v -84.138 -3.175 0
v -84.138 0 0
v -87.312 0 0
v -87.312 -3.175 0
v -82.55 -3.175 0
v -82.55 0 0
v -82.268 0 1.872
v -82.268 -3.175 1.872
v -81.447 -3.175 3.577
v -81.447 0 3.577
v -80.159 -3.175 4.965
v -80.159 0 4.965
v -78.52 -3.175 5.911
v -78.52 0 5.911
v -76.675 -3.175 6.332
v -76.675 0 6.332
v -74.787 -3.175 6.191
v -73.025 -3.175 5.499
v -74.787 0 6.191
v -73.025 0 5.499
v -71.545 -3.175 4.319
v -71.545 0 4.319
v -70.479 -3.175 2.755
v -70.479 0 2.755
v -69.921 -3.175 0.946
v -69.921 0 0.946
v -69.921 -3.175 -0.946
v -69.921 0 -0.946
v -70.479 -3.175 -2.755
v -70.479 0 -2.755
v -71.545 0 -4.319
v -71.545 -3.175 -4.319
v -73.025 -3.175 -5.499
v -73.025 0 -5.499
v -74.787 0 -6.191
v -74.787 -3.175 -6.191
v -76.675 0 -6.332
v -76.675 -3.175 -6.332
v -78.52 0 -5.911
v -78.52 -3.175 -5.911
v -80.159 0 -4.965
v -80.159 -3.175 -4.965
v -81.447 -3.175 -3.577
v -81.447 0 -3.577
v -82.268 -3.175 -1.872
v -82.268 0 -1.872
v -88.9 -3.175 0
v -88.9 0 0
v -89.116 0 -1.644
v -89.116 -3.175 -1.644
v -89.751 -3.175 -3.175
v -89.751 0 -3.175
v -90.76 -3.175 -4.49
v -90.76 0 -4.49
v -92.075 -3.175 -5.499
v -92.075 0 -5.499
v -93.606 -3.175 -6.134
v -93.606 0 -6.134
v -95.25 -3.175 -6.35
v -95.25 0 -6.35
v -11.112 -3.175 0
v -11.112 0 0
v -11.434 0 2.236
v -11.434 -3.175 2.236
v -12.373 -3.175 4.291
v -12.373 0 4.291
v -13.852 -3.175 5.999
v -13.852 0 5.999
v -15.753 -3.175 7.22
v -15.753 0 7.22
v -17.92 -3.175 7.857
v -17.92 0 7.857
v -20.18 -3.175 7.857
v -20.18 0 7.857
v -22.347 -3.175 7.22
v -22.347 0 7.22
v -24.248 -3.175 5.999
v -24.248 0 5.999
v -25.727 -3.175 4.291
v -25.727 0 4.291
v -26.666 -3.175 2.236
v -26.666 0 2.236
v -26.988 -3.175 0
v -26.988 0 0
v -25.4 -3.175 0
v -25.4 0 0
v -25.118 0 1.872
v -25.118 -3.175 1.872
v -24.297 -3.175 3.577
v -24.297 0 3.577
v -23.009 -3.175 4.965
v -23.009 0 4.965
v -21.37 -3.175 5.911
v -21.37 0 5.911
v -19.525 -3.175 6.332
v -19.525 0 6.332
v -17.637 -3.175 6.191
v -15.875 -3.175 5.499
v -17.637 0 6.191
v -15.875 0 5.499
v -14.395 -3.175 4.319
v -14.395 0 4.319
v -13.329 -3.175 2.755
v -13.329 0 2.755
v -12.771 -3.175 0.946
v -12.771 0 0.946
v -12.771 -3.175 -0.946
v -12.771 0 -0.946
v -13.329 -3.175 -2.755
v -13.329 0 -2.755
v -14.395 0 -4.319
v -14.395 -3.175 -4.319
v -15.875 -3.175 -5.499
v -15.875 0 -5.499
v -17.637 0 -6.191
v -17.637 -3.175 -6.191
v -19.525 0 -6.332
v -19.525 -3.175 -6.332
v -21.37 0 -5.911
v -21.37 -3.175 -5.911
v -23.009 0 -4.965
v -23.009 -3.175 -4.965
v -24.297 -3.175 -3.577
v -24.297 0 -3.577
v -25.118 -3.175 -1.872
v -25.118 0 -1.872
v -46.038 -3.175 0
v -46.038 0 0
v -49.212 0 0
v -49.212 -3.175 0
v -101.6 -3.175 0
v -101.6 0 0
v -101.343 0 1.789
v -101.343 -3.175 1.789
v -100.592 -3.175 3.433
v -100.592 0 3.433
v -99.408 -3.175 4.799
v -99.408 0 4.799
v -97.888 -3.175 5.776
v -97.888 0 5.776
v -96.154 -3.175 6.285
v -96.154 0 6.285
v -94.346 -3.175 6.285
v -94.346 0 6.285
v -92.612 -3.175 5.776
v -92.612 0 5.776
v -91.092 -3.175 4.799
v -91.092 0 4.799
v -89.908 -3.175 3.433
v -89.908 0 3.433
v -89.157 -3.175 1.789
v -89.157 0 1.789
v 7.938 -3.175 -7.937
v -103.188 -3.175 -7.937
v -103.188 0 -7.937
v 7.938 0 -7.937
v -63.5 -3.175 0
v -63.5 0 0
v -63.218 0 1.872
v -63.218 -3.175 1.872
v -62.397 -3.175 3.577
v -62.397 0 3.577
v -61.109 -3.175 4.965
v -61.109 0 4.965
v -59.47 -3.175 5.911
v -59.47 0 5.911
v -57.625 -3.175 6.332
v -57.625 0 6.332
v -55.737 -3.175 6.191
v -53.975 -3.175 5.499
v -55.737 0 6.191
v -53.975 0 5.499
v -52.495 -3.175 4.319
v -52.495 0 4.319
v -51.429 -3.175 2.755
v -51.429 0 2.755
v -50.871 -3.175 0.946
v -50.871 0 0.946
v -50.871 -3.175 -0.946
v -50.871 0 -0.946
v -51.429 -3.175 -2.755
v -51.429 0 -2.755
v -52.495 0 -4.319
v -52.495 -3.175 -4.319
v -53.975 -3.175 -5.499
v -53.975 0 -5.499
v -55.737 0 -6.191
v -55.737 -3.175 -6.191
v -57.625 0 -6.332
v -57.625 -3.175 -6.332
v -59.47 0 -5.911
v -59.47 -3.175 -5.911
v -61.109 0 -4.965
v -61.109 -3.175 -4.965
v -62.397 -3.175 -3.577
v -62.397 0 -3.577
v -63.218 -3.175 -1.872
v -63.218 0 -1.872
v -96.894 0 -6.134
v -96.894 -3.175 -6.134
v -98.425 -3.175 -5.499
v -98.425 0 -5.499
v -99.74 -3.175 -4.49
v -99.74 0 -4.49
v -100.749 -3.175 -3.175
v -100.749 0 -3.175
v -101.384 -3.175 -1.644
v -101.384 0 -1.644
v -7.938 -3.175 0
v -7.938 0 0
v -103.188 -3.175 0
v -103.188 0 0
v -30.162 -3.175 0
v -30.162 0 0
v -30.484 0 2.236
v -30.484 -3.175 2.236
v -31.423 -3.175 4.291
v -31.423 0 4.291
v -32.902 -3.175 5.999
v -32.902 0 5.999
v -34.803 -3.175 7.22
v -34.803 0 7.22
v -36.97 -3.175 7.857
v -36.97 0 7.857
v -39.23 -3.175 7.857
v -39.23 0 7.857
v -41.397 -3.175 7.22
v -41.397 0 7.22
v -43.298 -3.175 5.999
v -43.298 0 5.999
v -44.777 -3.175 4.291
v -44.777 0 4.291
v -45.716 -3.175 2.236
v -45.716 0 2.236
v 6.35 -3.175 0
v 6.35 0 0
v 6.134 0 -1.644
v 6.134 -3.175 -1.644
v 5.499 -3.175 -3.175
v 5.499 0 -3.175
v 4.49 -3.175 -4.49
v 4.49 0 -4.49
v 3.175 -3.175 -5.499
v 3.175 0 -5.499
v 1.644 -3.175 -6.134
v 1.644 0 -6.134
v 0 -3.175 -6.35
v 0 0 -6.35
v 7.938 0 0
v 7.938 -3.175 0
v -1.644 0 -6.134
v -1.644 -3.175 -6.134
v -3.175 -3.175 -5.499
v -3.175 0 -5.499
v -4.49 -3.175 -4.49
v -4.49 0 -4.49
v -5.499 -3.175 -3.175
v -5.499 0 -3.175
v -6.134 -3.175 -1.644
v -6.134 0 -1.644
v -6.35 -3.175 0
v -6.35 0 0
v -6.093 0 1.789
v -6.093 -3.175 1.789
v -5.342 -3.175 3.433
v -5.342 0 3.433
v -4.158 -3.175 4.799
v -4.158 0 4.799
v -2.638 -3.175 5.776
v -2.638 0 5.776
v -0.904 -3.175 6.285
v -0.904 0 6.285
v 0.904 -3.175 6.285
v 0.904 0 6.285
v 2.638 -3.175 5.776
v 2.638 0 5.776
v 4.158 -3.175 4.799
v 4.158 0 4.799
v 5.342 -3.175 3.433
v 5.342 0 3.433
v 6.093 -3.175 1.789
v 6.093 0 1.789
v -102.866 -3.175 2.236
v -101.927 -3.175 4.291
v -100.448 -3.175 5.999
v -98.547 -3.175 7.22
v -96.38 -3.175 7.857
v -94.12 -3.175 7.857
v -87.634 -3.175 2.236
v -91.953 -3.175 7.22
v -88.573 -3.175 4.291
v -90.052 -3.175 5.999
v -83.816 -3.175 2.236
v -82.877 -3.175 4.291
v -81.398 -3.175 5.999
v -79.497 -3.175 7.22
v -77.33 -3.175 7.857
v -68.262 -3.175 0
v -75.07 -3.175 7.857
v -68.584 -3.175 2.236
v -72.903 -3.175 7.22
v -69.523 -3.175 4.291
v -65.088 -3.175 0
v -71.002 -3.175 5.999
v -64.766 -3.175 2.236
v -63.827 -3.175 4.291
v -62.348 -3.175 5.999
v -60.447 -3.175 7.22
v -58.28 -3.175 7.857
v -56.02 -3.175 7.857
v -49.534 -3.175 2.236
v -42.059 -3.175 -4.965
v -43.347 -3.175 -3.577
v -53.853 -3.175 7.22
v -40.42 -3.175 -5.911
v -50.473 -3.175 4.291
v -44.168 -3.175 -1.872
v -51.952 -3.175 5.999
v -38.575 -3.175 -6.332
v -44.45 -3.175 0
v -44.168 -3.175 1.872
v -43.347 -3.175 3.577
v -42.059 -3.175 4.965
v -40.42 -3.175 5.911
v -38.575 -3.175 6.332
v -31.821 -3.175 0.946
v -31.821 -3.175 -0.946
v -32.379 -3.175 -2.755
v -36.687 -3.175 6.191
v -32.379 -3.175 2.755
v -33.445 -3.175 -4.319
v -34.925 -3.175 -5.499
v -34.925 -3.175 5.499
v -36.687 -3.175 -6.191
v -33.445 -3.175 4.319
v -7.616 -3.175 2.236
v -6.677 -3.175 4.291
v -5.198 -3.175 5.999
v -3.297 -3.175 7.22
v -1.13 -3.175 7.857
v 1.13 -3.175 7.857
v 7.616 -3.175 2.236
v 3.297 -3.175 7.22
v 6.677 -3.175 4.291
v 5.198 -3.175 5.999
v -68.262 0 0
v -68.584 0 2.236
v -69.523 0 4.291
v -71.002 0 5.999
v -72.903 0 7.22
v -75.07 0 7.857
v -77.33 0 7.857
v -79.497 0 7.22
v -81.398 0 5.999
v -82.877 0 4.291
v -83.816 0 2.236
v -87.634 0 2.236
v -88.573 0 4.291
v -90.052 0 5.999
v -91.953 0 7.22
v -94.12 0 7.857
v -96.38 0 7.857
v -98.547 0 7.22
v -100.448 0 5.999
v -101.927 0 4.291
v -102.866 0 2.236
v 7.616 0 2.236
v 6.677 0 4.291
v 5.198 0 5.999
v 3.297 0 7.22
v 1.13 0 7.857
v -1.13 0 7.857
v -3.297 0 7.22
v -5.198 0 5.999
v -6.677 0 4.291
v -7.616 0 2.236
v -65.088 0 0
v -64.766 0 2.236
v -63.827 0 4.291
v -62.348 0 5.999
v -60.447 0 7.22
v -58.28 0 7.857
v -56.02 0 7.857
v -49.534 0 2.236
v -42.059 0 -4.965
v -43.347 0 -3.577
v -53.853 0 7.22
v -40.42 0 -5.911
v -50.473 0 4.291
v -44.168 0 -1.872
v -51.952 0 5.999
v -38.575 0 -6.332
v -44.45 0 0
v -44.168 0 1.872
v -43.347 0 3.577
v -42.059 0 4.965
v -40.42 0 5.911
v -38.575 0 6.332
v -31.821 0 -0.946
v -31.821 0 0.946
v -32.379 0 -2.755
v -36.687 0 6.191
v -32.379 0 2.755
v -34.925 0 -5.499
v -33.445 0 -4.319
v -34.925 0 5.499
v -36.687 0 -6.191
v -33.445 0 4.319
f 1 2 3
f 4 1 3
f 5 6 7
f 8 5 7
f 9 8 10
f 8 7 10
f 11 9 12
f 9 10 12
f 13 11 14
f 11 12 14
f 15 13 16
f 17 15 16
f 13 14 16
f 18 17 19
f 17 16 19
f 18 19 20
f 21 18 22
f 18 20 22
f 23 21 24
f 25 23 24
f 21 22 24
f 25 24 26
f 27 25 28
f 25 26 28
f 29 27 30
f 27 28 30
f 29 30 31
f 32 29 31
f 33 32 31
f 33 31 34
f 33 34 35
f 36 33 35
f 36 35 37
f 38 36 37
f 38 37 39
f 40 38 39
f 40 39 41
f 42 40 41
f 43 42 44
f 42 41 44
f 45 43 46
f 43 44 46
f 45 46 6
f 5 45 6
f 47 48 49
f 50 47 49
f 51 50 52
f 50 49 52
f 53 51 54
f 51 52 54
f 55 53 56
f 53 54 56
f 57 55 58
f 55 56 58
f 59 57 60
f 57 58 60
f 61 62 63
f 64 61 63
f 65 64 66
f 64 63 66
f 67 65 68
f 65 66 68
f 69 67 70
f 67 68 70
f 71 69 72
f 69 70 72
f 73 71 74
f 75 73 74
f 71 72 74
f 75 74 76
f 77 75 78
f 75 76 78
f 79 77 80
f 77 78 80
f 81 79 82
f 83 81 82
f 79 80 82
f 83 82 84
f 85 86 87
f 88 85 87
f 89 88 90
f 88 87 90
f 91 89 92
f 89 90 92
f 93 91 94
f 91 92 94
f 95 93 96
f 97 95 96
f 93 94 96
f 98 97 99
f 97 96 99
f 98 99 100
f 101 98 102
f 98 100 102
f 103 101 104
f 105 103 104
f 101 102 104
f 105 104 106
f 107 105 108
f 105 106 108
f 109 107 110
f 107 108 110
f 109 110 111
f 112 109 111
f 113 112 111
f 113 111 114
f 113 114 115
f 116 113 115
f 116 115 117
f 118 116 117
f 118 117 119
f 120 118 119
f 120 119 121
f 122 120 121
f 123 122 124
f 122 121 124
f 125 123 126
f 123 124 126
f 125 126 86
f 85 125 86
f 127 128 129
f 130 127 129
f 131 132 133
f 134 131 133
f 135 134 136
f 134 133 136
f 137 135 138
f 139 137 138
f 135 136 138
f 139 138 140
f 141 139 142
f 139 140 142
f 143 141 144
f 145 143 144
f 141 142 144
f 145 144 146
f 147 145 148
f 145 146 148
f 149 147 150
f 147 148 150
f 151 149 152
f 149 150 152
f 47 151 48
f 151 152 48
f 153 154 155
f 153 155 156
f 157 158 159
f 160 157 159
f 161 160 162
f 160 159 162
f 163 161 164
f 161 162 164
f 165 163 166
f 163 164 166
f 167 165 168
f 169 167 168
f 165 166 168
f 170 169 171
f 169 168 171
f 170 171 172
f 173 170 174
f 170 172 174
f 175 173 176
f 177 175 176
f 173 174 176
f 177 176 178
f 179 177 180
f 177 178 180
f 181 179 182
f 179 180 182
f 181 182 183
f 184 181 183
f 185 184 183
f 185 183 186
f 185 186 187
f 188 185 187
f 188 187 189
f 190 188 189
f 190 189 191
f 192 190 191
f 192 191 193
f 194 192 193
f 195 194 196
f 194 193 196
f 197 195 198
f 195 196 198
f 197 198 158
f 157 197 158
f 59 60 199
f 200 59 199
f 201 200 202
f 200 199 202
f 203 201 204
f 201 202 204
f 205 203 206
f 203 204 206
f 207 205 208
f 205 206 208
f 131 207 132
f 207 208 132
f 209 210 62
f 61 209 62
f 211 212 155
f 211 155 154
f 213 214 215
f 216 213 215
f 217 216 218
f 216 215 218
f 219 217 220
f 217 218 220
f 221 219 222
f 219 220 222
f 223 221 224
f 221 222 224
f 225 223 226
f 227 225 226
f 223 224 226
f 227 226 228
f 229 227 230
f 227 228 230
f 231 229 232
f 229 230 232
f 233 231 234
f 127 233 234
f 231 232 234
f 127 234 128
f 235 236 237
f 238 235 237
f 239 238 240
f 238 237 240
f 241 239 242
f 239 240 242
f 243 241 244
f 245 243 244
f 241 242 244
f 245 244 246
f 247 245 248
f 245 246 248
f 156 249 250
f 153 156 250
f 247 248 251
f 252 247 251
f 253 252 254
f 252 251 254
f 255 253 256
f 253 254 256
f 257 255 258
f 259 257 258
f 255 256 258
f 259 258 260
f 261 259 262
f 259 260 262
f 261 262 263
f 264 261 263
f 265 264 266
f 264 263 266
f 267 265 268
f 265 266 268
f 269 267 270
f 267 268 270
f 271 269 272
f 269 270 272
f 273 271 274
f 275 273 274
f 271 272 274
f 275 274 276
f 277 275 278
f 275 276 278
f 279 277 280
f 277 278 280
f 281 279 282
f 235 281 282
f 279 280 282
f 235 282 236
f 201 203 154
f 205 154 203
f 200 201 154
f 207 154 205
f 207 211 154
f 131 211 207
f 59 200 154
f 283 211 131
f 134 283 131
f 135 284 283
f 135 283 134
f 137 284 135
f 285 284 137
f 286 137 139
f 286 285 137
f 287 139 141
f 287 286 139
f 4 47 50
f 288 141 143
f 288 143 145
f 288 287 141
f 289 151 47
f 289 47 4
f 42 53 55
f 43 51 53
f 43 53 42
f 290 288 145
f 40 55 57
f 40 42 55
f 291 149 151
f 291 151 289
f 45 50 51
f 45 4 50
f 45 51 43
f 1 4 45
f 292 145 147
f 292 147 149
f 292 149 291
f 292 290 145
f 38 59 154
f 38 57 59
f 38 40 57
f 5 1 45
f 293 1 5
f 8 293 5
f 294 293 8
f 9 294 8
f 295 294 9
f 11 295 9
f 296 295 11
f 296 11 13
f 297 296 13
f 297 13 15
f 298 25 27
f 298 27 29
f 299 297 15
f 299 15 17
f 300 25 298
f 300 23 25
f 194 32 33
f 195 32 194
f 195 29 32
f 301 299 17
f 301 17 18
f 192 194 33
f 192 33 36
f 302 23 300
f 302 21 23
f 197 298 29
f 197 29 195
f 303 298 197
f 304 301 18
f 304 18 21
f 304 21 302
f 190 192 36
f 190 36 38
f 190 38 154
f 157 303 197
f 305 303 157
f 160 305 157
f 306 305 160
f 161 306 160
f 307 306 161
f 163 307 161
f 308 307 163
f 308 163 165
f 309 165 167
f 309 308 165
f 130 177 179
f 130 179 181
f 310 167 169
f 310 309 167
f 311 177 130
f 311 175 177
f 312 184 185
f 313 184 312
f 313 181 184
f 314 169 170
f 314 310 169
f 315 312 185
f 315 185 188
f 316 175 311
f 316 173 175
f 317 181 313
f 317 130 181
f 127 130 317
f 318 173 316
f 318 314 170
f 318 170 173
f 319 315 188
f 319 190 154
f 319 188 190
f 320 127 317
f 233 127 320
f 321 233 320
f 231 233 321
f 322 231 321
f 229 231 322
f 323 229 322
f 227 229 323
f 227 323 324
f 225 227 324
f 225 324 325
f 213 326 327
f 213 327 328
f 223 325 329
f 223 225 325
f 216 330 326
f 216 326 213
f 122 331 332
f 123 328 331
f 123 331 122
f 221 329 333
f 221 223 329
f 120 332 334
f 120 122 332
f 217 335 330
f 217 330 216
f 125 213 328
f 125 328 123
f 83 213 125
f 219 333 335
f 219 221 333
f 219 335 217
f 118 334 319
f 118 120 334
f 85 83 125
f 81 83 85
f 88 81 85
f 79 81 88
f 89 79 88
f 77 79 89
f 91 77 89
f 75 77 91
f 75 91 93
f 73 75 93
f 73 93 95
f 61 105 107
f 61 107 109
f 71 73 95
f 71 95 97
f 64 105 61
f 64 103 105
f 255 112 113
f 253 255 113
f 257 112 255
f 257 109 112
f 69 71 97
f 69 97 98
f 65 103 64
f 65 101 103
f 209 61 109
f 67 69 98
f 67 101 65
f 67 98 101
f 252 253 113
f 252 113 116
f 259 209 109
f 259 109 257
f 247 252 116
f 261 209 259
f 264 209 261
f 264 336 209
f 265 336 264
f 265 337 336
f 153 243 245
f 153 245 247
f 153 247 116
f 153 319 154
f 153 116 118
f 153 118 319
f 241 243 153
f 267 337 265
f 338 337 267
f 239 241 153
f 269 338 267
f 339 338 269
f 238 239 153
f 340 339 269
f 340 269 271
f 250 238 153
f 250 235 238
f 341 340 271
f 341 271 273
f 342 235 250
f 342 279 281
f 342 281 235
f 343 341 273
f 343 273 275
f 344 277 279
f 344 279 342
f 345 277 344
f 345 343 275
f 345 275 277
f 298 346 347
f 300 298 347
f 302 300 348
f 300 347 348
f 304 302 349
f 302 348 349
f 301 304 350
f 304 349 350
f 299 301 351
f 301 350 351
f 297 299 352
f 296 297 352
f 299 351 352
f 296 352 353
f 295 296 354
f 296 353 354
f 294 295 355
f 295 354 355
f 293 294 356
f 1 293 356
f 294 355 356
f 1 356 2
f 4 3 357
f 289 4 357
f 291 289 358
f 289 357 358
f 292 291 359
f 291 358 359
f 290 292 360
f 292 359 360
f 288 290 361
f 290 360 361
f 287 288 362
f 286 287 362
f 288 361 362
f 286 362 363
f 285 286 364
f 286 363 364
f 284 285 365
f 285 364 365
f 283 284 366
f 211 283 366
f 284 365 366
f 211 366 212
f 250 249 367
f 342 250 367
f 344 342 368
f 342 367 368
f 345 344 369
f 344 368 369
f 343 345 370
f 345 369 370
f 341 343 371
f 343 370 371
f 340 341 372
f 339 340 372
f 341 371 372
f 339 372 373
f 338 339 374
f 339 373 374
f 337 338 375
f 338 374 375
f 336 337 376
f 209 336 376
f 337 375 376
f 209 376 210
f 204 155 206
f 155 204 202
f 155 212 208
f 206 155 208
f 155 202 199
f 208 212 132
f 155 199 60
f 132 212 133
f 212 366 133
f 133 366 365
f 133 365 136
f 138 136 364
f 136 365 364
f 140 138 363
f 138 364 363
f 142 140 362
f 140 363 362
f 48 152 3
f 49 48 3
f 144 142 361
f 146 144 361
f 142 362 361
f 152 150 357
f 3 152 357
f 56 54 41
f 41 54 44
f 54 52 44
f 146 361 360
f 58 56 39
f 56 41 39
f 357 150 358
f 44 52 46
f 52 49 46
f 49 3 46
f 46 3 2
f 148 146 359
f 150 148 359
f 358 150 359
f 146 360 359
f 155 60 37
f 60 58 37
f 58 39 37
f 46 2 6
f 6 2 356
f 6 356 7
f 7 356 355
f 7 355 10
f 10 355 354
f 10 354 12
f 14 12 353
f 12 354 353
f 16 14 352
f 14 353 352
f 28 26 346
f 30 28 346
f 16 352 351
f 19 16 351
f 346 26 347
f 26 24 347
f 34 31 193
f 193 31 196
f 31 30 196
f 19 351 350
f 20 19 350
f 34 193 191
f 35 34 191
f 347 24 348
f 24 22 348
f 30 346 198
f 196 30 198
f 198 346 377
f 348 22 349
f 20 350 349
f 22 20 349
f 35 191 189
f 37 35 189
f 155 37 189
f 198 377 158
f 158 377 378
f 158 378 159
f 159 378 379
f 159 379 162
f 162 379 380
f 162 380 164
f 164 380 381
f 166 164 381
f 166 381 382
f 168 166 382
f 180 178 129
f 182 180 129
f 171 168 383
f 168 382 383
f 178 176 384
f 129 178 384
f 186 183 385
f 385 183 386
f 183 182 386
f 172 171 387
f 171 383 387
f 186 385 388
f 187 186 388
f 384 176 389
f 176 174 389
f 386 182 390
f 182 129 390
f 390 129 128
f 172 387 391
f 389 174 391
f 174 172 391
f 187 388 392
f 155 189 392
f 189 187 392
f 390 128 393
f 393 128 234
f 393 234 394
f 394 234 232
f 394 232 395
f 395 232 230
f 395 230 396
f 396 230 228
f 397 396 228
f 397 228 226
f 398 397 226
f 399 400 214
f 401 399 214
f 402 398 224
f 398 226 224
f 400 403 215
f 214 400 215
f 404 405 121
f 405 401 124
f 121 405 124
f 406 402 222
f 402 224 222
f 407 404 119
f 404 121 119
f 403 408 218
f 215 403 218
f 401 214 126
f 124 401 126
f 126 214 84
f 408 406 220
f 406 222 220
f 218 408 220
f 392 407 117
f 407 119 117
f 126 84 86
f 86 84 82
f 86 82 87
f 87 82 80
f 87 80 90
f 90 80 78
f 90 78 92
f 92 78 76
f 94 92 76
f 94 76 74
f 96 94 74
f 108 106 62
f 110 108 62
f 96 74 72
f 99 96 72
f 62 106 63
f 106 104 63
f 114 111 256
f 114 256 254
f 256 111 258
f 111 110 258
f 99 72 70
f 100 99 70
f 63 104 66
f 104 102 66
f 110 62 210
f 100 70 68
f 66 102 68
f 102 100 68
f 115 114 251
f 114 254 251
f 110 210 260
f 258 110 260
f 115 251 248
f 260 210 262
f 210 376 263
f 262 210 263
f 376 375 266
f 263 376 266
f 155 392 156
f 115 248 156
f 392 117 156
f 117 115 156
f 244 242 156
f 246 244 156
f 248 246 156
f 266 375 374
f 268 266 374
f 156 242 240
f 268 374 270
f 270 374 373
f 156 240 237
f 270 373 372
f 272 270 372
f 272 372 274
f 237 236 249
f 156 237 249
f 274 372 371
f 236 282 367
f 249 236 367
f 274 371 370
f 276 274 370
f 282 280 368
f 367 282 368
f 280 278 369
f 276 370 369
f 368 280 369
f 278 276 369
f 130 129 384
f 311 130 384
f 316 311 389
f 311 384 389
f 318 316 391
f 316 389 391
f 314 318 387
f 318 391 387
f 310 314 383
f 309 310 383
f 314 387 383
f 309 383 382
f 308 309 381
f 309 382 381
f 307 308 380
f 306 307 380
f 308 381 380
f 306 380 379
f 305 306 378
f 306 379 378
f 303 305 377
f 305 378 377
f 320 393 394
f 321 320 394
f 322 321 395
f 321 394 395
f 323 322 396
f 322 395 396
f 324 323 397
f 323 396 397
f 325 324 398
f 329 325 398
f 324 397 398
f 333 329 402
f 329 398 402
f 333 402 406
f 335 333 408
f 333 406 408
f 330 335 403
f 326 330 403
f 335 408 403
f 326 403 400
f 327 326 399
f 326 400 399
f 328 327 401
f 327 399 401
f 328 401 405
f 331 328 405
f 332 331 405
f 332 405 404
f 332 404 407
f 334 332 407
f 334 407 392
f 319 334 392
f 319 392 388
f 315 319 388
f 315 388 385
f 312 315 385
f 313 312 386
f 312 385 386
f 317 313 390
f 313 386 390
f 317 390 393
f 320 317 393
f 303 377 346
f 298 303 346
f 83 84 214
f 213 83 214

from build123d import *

# Parameters (mm, degrees)
F1_DEPTH = 3.175
F2_W     = 111.125
F2_H     = 1.5875
F3_DEPTH = 15.875
F4_W     = 111.125
F4_H     = 19.05
F5_DEPTH = 1.5748
F6_W     = 111.125
F6_H     = 3.1623
F7_DEPTH = 25.4


with BuildPart() as f1:
    # F0 (on Front) → F1 (new body)
    with BuildSketch(Plane.XZ):
        with BuildLine():
            ThreePointArc((0, -6.35), (-4.4901280605, -4.4901280605), (-6.35, 0))
            Line((-6.35, 0), (-7.9375, 0))
            ThreePointArc((-7.9375, 0), (-5.6126600757, -5.6126600757), (0, -7.9375))
            Line((0, -7.9375), (0, -6.35))
        make_face()
        with BuildLine():
            Line((-7.9375, 0), (-6.35, 0))
            ThreePointArc((-6.35, 0), (0, 6.35), (6.35, 0))
            Line((6.35, 0), (7.9375, 0))
            ThreePointArc((7.9375, 0), (0, 7.9375), (-7.9375, 0))
        make_face()
        with BuildLine():
            Line((7.9375, 0), (6.35, 0))
            ThreePointArc((6.35, 0), (4.4901280605, -4.4901280605), (0, -6.35))
            Line((0, -6.35), (0, -7.9375))
            ThreePointArc((0, -7.9375), (5.6126600757, -5.6126600757), (7.9375, 0))
        make_face()
        with BuildLine():
            ThreePointArc((0, -7.9375), (-5.6126600757, -5.6126600757), (-7.9375, 0))
            Line((-7.9375, 0), (-11.1125, 0))
            ThreePointArc((-11.1125, 0), (-13.4373399347, -5.6126600861), (-19.0500000294, -7.9375))
            Line((-19.0500000294, -7.9375), (0, -7.9375))
        make_face()
        with BuildLine():
            Line((7.9375, -7.9375), (7.9375, 0))
            ThreePointArc((7.9375, 0), (5.6126600757, -5.6126600757), (0, -7.9375))
            Line((0, -7.9375), (7.9375, -7.9375))
        make_face()
        Polygon((7.9375, -7.9375), (0, -7.9375), (-19.0500000294, -7.9375), (-38.1000000951, -7.9375), (-57.15, -7.9375), (-76.2, -7.9375), (-95.25, -7.9375), (-103.1875, -7.9375), (-103.1875, -9.525), (7.9375, -9.525), align=None)
        with BuildLine():
            ThreePointArc((-19.0500000294, -7.9375), (-13.4373399347, -5.6126600861), (-11.1125, 0))
            Line((-11.1125, 0), (-12.7, 0))
            ThreePointArc((-12.7, 0), (-19.05, -6.35), (-25.4, 0))
            Line((-25.4, 0), (-26.9875, 0))
            ThreePointArc((-26.9875, 0), (-24.6626600861, -5.6126600653), (-19.0500000294, -7.9375))
        make_face()
        with BuildLine():
            Line((-12.7, 0), (-11.1125, 0))
            ThreePointArc((-11.1125, 0), (-19.05, 7.9375), (-26.9875, 0))
            Line((-26.9875, 0), (-25.4, 0))
            ThreePointArc((-25.4, 0), (-19.05, 6.35), (-12.7, 0))
        make_face()
        with BuildLine():
            Line((-38.1000000951, -7.9375), (-19.0500000294, -7.9375))
            ThreePointArc((-19.0500000294, -7.9375), (-24.6626600861, -5.6126600653), (-26.9875, 0))
            Line((-26.9875, 0), (-30.1625, 0))
            ThreePointArc((-30.1625, 0), (-32.487339958, -5.6126601093), (-38.1000000951, -7.9375))
        make_face()
        with BuildLine():
            Line((-57.15, -7.9375), (-38.1000000951, -7.9375))
            ThreePointArc((-38.1000000951, -7.9375), (-43.7126601093, -5.612660042), (-46.0375, 0))
            Line((-46.0375, 0), (-49.2125, 0))
            ThreePointArc((-49.2125, 0), (-51.5373399243, -5.6126600757), (-57.15, -7.9375))
        make_face()
        with BuildLine():
            ThreePointArc((-46.0375, 0), (-43.7126601093, -5.612660042), (-38.1000000951, -7.9375))
            ThreePointArc((-38.1000000951, -7.9375), (-32.487339958, -5.6126601093), (-30.1625, 0))
            Line((-30.1625, 0), (-31.75, 0))
            ThreePointArc((-31.75, 0), (-38.1, -6.35), (-44.45, 0))
            Line((-44.45, 0), (-46.0375, 0))
        make_face()
        with BuildLine():
            Line((-31.75, 0), (-30.1625, 0))
            ThreePointArc((-30.1625, 0), (-38.1, 7.9375), (-46.0375, 0))
            Line((-46.0375, 0), (-44.45, 0))
            ThreePointArc((-44.45, 0), (-38.1, 6.35), (-31.75, 0))
        make_face()
        with BuildLine():
            Line((-76.2, -7.9375), (-57.15, -7.9375))
            ThreePointArc((-57.15, -7.9375), (-62.7626600757, -5.6126600757), (-65.0875, 0))
            Line((-65.0875, 0), (-68.2625, 0))
            ThreePointArc((-68.2625, 0), (-70.5873399243, -5.6126600757), (-76.2, -7.9375))
        make_face()
        with BuildLine():
            ThreePointArc((-65.0875, 0), (-62.7626600757, -5.6126600757), (-57.15, -7.9375))
            ThreePointArc((-57.15, -7.9375), (-51.5373399243, -5.6126600757), (-49.2125, 0))
            Line((-49.2125, 0), (-50.8, 0))
            ThreePointArc((-50.8, 0), (-57.15, -6.35), (-63.5, 0))
            Line((-63.5, 0), (-65.0875, 0))
        make_face()
        with BuildLine():
            Line((-103.1875, 0), (-103.1875, -7.9375))
            Line((-103.1875, -7.9375), (-95.25, -7.9375))
            ThreePointArc((-95.25, -7.9375), (-100.8626600757, -5.6126600757), (-103.1875, 0))
        make_face()
        with BuildLine():
            Line((-50.8, 0), (-49.2125, 0))
            ThreePointArc((-49.2125, 0), (-57.15, 7.9375), (-65.0875, 0))
            Line((-65.0875, 0), (-63.5, 0))
            ThreePointArc((-63.5, 0), (-57.15, 6.35), (-50.8, 0))
        make_face()
        with BuildLine():
            Line((-95.25, -7.9375), (-76.2, -7.9375))
            ThreePointArc((-76.2, -7.9375), (-81.8126600757, -5.6126600757), (-84.1375, 0))
            Line((-84.1375, 0), (-87.3125, 0))
            ThreePointArc((-87.3125, 0), (-89.6373399243, -5.6126600757), (-95.25, -7.9375))
        make_face()
        with BuildLine():
            ThreePointArc((-84.1375, 0), (-81.8126600757, -5.6126600757), (-76.2, -7.9375))
            ThreePointArc((-76.2, -7.9375), (-70.5873399243, -5.6126600757), (-68.2625, 0))
            Line((-68.2625, 0), (-69.85, 0))
            ThreePointArc((-69.85, 0), (-76.2, -6.35), (-82.55, 0))
            Line((-82.55, 0), (-84.1375, 0))
        make_face()
        with BuildLine():
            Line((-101.6, 0), (-103.1875, 0))
            ThreePointArc((-103.1875, 0), (-100.8626600757, -5.6126600757), (-95.25, -7.9375))
            Line((-95.25, -7.9375), (-95.25, -6.35))
            ThreePointArc((-95.25, -6.35), (-99.7401280605, -4.4901280605), (-101.6, 0))
        make_face()
        with BuildLine():
            ThreePointArc((-87.3125, 0), (-95.25, 7.9375), (-103.1875, 0))
            Line((-103.1875, 0), (-101.6, 0))
            ThreePointArc((-101.6, 0), (-95.25, 6.35), (-88.9, 0))
            Line((-88.9, 0), (-87.3125, 0))
        make_face()
        with BuildLine():
            Line((-95.25, -6.35), (-95.25, -7.9375))
            ThreePointArc((-95.25, -7.9375), (-89.6373399243, -5.6126600757), (-87.3125, 0))
            Line((-87.3125, 0), (-88.9, 0))
            ThreePointArc((-88.9, 0), (-90.7598719395, -4.4901280605), (-95.25, -6.35))
        make_face()
        with BuildLine():
            Line((-69.85, 0), (-68.2625, 0))
            ThreePointArc((-68.2625, 0), (-76.2, 7.9375), (-84.1375, 0))
            Line((-84.1375, 0), (-82.55, 0))
            ThreePointArc((-82.55, 0), (-76.2, 6.35), (-69.85, 0))
        make_face()
    extrude(amount=F1_DEPTH)

    # F2 (on face) → F3 (join)
    with BuildSketch(Plane.XZ.offset(3.175)):
        with Locations((-47.625, -8.73125)):
            Rectangle(F2_W, F2_H)
    extrude(amount=F3_DEPTH)

    # F4 (on face) → F5 (join)
    with BuildSketch(Plane(origin=(0, 0, -9.525), x_dir=(1, 0, 0), z_dir=(0, 0, -1))):
        with Locations((-47.625, 9.525)):
            Rectangle(F4_W, F4_H)
    extrude(amount=F5_DEPTH)

    # F6 (on face) → F7 (cut)
    with BuildSketch(Plane.XZ.offset(19.05)):
        with Locations((-47.625, -9.51865)):
            Rectangle(F6_W, F6_H)
    extrude(amount=-F7_DEPTH, mode=Mode.SUBTRACT)


solid = f1.part
